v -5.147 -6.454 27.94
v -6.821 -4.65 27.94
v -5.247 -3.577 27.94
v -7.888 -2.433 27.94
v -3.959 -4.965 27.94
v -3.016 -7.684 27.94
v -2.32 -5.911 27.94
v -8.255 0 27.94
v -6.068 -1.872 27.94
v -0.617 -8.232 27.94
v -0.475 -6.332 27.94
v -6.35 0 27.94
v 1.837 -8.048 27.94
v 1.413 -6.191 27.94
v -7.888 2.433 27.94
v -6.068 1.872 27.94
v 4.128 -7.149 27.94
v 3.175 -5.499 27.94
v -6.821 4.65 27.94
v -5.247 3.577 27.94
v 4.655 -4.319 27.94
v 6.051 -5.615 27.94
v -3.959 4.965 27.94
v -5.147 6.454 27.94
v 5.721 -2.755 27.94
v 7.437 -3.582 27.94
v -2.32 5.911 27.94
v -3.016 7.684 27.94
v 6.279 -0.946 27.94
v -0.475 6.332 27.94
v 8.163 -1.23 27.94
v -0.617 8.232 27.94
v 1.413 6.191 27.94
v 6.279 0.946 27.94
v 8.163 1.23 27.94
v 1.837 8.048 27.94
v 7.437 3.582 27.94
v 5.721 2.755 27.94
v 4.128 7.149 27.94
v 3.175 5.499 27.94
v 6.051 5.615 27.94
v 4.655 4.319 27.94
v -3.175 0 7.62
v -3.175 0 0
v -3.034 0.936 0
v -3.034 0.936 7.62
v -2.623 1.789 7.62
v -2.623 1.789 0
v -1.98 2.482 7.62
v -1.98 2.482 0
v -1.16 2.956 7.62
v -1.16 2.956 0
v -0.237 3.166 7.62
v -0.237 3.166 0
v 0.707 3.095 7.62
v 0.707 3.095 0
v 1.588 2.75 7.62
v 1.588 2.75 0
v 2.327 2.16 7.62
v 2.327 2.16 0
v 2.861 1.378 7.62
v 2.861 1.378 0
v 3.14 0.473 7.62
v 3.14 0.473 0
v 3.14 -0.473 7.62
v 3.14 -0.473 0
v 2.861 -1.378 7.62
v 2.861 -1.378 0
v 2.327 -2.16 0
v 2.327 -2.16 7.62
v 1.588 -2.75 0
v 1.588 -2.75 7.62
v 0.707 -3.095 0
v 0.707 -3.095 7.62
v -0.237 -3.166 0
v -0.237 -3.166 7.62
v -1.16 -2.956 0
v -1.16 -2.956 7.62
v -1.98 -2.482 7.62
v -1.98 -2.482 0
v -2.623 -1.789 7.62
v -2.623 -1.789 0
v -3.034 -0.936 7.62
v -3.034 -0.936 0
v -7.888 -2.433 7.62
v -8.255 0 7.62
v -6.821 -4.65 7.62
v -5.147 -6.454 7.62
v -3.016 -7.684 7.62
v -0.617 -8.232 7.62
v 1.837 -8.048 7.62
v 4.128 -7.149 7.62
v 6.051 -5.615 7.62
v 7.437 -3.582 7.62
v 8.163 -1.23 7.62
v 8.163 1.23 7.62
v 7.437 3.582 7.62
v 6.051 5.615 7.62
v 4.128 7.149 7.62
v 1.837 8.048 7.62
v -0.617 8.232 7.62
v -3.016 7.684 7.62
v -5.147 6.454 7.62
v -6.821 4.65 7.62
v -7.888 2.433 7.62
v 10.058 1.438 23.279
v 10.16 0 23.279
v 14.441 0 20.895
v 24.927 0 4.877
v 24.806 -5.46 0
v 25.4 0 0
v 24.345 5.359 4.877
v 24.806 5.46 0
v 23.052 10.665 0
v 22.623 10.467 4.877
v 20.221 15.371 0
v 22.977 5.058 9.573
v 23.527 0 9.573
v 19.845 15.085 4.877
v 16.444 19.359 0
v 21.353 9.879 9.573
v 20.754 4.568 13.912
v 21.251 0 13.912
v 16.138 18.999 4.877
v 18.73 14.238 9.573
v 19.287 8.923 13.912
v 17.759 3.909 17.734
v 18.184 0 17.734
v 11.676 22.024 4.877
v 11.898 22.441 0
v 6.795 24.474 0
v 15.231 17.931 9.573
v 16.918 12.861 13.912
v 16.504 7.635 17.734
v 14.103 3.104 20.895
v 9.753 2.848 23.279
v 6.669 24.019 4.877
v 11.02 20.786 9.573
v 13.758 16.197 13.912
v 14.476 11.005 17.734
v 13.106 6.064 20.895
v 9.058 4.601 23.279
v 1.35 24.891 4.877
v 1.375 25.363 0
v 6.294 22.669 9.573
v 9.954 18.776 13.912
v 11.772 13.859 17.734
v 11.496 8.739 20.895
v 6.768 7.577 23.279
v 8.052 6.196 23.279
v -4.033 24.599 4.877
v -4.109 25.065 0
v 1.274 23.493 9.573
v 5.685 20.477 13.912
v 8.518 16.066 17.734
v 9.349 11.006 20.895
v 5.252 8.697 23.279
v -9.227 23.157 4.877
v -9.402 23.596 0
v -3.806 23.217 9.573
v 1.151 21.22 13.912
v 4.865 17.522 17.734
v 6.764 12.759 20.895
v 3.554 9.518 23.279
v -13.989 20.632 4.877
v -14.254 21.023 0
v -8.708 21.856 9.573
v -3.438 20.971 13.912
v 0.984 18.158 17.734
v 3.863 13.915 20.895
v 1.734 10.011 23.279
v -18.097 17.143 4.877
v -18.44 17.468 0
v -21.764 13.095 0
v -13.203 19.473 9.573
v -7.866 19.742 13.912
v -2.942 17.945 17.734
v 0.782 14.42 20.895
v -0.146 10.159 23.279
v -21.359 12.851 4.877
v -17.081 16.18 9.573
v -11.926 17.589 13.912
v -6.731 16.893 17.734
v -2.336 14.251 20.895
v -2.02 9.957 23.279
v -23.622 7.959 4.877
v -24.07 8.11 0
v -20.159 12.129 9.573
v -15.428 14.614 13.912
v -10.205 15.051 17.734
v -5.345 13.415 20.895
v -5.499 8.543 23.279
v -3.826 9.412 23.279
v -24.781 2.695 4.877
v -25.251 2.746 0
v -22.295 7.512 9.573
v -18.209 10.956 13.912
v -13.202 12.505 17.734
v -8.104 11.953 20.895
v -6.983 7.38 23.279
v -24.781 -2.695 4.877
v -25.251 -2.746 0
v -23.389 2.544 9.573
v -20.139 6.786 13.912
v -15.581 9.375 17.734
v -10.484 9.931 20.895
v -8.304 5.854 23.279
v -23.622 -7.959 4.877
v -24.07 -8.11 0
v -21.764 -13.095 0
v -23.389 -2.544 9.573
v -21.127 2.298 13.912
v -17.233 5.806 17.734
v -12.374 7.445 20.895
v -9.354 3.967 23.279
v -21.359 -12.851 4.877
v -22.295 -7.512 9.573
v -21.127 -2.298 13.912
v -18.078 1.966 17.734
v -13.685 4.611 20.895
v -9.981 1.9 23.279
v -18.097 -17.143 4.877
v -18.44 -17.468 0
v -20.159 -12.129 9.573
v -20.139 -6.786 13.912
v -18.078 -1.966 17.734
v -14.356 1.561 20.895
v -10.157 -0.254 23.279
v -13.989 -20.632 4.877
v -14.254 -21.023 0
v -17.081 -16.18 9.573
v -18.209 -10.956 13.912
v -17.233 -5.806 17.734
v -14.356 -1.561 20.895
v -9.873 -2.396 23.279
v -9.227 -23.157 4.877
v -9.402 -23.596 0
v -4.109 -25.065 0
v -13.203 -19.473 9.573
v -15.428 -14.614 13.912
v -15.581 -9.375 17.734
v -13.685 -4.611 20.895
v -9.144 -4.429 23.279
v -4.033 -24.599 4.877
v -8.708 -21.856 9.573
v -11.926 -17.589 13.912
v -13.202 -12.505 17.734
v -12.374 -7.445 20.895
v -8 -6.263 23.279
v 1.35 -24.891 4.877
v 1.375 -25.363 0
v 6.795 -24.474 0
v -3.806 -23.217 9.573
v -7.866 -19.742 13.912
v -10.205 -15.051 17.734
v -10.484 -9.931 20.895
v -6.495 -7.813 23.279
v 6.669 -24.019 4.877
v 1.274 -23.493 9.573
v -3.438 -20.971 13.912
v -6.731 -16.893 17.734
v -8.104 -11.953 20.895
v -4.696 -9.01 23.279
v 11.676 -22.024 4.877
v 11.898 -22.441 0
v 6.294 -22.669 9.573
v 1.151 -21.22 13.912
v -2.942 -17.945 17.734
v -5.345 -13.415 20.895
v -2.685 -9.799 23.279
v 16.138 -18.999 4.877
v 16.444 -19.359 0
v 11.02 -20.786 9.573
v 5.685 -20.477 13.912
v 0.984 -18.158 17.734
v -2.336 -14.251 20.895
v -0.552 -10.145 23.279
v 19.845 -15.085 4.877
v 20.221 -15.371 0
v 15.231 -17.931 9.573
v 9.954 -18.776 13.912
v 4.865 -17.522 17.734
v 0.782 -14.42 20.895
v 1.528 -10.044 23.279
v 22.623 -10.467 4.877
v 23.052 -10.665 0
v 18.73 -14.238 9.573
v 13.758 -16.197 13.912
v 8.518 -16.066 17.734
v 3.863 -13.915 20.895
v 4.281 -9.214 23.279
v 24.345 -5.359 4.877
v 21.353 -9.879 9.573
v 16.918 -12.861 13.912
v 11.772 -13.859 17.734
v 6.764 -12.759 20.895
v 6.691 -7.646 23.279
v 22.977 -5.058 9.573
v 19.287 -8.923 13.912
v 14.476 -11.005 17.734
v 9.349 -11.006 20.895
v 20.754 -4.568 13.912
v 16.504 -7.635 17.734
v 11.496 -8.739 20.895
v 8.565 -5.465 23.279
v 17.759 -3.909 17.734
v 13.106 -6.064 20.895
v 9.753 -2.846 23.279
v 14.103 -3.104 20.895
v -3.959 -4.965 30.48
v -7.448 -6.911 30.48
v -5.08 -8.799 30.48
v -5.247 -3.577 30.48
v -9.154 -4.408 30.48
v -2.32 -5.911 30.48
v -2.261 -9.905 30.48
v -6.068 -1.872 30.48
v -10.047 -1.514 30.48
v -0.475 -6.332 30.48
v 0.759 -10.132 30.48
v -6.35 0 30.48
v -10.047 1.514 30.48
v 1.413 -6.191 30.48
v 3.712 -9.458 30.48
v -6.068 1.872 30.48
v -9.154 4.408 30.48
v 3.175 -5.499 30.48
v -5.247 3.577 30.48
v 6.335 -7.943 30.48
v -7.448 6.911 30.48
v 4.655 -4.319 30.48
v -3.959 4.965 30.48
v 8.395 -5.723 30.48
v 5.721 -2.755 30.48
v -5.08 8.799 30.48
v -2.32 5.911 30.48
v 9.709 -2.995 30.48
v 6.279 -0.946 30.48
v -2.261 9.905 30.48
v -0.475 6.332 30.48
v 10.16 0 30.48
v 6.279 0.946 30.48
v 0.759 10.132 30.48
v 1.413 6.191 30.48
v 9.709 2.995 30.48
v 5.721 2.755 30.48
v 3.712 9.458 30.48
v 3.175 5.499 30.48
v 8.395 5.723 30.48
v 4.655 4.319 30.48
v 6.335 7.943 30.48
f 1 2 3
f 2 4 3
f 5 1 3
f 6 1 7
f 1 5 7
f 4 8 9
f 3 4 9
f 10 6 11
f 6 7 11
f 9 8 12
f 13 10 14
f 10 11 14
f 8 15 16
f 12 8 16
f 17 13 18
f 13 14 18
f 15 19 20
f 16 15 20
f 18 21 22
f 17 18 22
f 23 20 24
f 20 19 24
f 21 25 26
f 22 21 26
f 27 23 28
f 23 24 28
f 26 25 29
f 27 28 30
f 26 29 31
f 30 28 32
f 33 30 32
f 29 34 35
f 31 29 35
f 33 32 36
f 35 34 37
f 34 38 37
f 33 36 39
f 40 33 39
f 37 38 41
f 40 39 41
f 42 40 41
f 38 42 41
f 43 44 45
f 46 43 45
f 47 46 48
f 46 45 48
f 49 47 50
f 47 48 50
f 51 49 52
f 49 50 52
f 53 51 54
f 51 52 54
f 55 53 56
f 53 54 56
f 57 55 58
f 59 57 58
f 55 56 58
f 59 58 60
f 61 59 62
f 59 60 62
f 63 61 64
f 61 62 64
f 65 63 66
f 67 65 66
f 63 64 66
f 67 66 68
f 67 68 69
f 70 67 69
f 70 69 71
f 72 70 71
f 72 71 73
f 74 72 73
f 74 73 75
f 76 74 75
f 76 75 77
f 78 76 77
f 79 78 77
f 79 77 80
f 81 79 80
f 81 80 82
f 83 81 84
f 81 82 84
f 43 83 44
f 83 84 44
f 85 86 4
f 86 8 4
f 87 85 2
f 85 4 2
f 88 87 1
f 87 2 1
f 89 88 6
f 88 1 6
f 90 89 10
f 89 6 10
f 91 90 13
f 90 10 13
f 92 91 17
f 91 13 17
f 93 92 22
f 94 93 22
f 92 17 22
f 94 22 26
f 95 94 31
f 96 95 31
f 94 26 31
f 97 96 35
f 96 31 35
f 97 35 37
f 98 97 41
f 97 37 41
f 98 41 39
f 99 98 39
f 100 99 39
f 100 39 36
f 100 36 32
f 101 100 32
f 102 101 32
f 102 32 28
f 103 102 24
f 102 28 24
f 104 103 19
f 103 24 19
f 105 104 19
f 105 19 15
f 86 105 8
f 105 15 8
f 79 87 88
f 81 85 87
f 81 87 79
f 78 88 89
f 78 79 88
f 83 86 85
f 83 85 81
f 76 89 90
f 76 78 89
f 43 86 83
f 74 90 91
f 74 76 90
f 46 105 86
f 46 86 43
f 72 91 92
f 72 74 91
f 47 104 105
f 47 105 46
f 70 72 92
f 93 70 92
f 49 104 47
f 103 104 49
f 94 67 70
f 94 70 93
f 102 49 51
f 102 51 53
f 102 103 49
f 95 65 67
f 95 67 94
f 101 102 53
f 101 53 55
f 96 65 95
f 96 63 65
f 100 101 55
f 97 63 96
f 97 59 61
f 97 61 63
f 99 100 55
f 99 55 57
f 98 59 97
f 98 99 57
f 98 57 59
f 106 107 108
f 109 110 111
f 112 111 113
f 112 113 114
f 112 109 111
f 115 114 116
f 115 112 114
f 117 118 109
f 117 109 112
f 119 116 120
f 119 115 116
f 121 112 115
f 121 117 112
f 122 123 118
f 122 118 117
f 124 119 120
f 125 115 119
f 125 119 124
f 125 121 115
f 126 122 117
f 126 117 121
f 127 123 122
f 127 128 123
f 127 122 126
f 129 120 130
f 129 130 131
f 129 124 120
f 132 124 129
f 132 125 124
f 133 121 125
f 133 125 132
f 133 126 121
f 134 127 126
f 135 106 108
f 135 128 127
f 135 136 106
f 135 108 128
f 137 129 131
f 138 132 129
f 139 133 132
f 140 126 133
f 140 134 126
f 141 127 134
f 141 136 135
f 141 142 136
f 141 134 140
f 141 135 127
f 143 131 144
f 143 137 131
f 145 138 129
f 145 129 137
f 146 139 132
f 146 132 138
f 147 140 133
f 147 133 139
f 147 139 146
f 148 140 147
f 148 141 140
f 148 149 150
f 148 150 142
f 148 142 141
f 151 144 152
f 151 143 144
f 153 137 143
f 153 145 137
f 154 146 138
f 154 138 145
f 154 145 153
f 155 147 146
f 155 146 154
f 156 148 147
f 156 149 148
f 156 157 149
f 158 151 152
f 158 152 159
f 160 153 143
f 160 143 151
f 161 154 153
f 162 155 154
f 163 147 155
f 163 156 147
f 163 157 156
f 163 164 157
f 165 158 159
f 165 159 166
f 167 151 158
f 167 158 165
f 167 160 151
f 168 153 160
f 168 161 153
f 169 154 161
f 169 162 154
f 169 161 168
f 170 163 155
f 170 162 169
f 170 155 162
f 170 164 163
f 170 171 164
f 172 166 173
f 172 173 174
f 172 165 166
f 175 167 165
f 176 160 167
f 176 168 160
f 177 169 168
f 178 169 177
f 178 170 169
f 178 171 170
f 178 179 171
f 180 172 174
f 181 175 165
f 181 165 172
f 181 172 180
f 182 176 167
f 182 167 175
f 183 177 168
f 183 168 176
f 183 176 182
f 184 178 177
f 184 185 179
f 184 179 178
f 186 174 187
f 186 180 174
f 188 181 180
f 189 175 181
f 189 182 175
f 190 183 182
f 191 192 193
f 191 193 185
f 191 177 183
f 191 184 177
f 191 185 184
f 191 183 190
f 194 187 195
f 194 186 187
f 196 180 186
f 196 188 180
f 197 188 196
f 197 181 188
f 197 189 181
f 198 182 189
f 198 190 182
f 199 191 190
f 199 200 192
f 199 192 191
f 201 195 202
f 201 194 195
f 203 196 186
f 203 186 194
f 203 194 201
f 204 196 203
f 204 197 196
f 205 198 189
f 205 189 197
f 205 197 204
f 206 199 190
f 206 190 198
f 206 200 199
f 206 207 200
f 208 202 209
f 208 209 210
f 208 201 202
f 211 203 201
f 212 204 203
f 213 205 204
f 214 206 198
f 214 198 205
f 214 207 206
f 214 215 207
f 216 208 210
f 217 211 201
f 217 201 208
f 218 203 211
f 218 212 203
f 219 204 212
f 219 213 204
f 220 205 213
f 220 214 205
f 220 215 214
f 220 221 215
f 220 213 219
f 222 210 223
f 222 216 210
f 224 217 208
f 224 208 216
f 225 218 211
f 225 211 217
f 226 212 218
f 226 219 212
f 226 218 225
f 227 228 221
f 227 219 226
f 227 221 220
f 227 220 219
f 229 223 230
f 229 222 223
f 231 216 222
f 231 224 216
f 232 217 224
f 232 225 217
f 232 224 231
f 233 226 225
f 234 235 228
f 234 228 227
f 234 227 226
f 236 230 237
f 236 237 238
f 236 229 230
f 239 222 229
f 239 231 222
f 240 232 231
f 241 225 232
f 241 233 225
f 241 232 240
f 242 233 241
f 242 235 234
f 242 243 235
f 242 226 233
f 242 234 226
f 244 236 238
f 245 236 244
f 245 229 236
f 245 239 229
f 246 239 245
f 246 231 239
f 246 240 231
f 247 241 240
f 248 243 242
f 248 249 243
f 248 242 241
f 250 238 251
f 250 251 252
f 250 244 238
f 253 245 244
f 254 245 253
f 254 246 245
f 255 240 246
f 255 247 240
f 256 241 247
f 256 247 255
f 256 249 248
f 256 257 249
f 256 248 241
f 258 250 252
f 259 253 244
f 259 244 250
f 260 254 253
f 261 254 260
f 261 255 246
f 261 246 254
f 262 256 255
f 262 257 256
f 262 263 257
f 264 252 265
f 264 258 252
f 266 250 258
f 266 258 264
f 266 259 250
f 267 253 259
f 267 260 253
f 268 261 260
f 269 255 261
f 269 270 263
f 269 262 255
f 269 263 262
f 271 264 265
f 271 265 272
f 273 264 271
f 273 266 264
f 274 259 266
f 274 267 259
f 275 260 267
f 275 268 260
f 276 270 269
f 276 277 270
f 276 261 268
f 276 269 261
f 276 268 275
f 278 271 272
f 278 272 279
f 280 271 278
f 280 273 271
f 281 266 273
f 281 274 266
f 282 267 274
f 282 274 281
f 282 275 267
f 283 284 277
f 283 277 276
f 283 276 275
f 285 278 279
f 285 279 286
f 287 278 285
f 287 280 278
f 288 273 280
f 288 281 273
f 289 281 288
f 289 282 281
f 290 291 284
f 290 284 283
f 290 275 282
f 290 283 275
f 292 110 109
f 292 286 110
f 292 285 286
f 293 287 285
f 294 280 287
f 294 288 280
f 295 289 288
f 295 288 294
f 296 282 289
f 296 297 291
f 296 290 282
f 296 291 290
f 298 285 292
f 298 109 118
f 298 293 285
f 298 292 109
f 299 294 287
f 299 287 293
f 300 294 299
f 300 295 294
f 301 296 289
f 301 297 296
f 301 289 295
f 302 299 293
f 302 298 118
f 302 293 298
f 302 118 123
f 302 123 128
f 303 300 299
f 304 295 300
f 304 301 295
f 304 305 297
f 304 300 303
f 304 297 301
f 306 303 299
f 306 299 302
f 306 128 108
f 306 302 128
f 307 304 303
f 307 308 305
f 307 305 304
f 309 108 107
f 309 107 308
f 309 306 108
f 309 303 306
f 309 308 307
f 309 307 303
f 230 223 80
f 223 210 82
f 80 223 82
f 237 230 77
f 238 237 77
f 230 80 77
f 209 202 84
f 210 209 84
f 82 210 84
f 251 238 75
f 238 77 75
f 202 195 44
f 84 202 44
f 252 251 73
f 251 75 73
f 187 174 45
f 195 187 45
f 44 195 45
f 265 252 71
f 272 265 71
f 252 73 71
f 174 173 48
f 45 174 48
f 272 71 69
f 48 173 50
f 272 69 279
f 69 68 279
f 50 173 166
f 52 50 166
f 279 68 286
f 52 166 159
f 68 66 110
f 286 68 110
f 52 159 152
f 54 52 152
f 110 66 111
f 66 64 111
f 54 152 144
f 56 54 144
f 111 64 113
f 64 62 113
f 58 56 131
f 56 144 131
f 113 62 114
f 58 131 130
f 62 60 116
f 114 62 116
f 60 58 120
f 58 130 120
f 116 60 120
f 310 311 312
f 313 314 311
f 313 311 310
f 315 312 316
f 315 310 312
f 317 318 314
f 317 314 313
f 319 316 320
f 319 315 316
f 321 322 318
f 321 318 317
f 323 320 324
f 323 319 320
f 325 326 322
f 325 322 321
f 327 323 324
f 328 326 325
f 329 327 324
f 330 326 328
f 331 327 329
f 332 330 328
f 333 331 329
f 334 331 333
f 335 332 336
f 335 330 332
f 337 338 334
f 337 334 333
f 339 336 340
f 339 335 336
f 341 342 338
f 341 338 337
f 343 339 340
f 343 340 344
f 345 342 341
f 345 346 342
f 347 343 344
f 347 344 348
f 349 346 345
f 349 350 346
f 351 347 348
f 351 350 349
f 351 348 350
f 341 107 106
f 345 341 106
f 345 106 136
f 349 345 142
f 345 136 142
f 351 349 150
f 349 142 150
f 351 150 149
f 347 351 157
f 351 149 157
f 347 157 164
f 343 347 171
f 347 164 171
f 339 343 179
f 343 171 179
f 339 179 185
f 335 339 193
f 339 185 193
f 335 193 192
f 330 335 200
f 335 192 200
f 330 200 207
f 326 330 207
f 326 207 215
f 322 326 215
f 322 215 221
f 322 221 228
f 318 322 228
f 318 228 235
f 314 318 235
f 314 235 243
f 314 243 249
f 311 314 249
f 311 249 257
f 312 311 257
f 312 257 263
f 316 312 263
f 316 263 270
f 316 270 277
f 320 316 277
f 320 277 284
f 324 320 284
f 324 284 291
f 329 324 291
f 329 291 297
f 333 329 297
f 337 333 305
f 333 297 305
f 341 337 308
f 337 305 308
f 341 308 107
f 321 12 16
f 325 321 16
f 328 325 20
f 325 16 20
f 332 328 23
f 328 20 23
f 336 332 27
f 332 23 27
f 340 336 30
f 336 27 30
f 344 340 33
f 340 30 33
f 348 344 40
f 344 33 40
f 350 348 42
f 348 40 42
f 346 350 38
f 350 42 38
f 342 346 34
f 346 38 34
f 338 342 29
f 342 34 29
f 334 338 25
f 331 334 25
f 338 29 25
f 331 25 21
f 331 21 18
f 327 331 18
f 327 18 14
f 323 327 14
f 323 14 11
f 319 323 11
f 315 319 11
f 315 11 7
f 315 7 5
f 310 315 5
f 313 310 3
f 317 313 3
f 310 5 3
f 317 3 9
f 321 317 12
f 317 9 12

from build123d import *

# Parameters (mm, degrees)
F1_R     = 25.4
F1_R_2   = 10.16
F2_DEPTH = 25.4
F3_R     = 25.39999
F4_DEPTH = 30.48
F7_D     = 16.51
F8_DEPTH = 7.62
F9_START = 27.94
F9_DEPTH = 2.54


# Not quite as in the source:
# - a variable given as a bare number and used for a length is read in inches; the dataset says mm whatever the document's units were
# - a fillet or chamfer is up to 0.001 mm smaller than in the source, because OpenCascade refuses the exact size


with BuildPart() as f2:
    # F1 (on Top) → F2 (new body)
    with BuildSketch(Plane.XY):
        Circle(F1_R)
        Circle(F1_R_2, mode=Mode.SUBTRACT)
        Circle(F1_R_2)
    extrude(amount=F2_DEPTH)

    # F3 (radius 25.4 in the source; OpenCascade refuses exactly that, so slightly less here)
    f3_edges = [f2.edges().sort_by_distance(p)[0] for p in [
        (-25.4, 0, 25.4),
    ]]
    fillet(f3_edges, radius=F3_R)

    # F1 (on Top) → F4 (join)
    with BuildSketch(Plane.XY):
        Circle(F1_R_2)
    extrude(amount=F4_DEPTH)

    # F7 (through all)
    with Locations(Plane(origin=(0, 0, 0), x_dir=(1, 0, 0), z_dir=(0, 0, -1))):
        with Locations((0, 0)):
            Hole(F7_D / 2)

    # F6 (on face) → F8 (join)
    with BuildSketch(Plane.XY):
        with BuildLine():
            ThreePointArc((-6.35, 0), (0, -6.35), (6.35, 0))
            Line((6.35, 0), (3.175, 0))
            ThreePointArc((3.175, 0), (0, -3.175), (-3.175, 0))
            Line((-3.175, 0), (-6.35, 0))
        make_face()
        with BuildLine():
            Line((3.175, 0), (6.35, 0))
            ThreePointArc((6.35, 0), (0, 6.35), (-6.35, 0))
            Line((-6.35, 0), (-3.175, 0))
            ThreePointArc((-3.175, 0), (0, 3.175), (3.175, 0))
        make_face()
        with BuildLine():
            Line((8.255, 0), (6.35, 0))
            ThreePointArc((6.35, 0), (0, -6.35), (-6.35, 0))
            Line((-6.35, 0), (-8.255, 0))
            ThreePointArc((-8.255, 0), (0, -8.255), (8.255, 0))
        make_face()
        with BuildLine():
            ThreePointArc((-6.35, 0), (0, 6.35), (6.35, 0))
            Line((6.35, 0), (8.255, 0))
            ThreePointArc((8.255, 0), (0, 8.255), (-8.255, 0))
            Line((-8.255, 0), (-6.35, 0))
        make_face()
    extrude(amount=F8_DEPTH)

    # F6 (on face) → F9 (join)
    with BuildSketch(Plane.XY.offset(F9_START)):
        with BuildLine():
            Line((8.255, 0), (6.35, 0))
            ThreePointArc((6.35, 0), (0, -6.35), (-6.35, 0))
            Line((-6.35, 0), (-8.255, 0))
            ThreePointArc((-8.255, 0), (0, -8.255), (8.255, 0))
        make_face()
        with BuildLine():
            ThreePointArc((-6.35, 0), (0, 6.35), (6.35, 0))
            Line((6.35, 0), (8.255, 0))
            ThreePointArc((8.255, 0), (0, 8.255), (-8.255, 0))
            Line((-8.255, 0), (-6.35, 0))
        make_face()
    extrude(amount=F9_DEPTH)


solid = f2.part
